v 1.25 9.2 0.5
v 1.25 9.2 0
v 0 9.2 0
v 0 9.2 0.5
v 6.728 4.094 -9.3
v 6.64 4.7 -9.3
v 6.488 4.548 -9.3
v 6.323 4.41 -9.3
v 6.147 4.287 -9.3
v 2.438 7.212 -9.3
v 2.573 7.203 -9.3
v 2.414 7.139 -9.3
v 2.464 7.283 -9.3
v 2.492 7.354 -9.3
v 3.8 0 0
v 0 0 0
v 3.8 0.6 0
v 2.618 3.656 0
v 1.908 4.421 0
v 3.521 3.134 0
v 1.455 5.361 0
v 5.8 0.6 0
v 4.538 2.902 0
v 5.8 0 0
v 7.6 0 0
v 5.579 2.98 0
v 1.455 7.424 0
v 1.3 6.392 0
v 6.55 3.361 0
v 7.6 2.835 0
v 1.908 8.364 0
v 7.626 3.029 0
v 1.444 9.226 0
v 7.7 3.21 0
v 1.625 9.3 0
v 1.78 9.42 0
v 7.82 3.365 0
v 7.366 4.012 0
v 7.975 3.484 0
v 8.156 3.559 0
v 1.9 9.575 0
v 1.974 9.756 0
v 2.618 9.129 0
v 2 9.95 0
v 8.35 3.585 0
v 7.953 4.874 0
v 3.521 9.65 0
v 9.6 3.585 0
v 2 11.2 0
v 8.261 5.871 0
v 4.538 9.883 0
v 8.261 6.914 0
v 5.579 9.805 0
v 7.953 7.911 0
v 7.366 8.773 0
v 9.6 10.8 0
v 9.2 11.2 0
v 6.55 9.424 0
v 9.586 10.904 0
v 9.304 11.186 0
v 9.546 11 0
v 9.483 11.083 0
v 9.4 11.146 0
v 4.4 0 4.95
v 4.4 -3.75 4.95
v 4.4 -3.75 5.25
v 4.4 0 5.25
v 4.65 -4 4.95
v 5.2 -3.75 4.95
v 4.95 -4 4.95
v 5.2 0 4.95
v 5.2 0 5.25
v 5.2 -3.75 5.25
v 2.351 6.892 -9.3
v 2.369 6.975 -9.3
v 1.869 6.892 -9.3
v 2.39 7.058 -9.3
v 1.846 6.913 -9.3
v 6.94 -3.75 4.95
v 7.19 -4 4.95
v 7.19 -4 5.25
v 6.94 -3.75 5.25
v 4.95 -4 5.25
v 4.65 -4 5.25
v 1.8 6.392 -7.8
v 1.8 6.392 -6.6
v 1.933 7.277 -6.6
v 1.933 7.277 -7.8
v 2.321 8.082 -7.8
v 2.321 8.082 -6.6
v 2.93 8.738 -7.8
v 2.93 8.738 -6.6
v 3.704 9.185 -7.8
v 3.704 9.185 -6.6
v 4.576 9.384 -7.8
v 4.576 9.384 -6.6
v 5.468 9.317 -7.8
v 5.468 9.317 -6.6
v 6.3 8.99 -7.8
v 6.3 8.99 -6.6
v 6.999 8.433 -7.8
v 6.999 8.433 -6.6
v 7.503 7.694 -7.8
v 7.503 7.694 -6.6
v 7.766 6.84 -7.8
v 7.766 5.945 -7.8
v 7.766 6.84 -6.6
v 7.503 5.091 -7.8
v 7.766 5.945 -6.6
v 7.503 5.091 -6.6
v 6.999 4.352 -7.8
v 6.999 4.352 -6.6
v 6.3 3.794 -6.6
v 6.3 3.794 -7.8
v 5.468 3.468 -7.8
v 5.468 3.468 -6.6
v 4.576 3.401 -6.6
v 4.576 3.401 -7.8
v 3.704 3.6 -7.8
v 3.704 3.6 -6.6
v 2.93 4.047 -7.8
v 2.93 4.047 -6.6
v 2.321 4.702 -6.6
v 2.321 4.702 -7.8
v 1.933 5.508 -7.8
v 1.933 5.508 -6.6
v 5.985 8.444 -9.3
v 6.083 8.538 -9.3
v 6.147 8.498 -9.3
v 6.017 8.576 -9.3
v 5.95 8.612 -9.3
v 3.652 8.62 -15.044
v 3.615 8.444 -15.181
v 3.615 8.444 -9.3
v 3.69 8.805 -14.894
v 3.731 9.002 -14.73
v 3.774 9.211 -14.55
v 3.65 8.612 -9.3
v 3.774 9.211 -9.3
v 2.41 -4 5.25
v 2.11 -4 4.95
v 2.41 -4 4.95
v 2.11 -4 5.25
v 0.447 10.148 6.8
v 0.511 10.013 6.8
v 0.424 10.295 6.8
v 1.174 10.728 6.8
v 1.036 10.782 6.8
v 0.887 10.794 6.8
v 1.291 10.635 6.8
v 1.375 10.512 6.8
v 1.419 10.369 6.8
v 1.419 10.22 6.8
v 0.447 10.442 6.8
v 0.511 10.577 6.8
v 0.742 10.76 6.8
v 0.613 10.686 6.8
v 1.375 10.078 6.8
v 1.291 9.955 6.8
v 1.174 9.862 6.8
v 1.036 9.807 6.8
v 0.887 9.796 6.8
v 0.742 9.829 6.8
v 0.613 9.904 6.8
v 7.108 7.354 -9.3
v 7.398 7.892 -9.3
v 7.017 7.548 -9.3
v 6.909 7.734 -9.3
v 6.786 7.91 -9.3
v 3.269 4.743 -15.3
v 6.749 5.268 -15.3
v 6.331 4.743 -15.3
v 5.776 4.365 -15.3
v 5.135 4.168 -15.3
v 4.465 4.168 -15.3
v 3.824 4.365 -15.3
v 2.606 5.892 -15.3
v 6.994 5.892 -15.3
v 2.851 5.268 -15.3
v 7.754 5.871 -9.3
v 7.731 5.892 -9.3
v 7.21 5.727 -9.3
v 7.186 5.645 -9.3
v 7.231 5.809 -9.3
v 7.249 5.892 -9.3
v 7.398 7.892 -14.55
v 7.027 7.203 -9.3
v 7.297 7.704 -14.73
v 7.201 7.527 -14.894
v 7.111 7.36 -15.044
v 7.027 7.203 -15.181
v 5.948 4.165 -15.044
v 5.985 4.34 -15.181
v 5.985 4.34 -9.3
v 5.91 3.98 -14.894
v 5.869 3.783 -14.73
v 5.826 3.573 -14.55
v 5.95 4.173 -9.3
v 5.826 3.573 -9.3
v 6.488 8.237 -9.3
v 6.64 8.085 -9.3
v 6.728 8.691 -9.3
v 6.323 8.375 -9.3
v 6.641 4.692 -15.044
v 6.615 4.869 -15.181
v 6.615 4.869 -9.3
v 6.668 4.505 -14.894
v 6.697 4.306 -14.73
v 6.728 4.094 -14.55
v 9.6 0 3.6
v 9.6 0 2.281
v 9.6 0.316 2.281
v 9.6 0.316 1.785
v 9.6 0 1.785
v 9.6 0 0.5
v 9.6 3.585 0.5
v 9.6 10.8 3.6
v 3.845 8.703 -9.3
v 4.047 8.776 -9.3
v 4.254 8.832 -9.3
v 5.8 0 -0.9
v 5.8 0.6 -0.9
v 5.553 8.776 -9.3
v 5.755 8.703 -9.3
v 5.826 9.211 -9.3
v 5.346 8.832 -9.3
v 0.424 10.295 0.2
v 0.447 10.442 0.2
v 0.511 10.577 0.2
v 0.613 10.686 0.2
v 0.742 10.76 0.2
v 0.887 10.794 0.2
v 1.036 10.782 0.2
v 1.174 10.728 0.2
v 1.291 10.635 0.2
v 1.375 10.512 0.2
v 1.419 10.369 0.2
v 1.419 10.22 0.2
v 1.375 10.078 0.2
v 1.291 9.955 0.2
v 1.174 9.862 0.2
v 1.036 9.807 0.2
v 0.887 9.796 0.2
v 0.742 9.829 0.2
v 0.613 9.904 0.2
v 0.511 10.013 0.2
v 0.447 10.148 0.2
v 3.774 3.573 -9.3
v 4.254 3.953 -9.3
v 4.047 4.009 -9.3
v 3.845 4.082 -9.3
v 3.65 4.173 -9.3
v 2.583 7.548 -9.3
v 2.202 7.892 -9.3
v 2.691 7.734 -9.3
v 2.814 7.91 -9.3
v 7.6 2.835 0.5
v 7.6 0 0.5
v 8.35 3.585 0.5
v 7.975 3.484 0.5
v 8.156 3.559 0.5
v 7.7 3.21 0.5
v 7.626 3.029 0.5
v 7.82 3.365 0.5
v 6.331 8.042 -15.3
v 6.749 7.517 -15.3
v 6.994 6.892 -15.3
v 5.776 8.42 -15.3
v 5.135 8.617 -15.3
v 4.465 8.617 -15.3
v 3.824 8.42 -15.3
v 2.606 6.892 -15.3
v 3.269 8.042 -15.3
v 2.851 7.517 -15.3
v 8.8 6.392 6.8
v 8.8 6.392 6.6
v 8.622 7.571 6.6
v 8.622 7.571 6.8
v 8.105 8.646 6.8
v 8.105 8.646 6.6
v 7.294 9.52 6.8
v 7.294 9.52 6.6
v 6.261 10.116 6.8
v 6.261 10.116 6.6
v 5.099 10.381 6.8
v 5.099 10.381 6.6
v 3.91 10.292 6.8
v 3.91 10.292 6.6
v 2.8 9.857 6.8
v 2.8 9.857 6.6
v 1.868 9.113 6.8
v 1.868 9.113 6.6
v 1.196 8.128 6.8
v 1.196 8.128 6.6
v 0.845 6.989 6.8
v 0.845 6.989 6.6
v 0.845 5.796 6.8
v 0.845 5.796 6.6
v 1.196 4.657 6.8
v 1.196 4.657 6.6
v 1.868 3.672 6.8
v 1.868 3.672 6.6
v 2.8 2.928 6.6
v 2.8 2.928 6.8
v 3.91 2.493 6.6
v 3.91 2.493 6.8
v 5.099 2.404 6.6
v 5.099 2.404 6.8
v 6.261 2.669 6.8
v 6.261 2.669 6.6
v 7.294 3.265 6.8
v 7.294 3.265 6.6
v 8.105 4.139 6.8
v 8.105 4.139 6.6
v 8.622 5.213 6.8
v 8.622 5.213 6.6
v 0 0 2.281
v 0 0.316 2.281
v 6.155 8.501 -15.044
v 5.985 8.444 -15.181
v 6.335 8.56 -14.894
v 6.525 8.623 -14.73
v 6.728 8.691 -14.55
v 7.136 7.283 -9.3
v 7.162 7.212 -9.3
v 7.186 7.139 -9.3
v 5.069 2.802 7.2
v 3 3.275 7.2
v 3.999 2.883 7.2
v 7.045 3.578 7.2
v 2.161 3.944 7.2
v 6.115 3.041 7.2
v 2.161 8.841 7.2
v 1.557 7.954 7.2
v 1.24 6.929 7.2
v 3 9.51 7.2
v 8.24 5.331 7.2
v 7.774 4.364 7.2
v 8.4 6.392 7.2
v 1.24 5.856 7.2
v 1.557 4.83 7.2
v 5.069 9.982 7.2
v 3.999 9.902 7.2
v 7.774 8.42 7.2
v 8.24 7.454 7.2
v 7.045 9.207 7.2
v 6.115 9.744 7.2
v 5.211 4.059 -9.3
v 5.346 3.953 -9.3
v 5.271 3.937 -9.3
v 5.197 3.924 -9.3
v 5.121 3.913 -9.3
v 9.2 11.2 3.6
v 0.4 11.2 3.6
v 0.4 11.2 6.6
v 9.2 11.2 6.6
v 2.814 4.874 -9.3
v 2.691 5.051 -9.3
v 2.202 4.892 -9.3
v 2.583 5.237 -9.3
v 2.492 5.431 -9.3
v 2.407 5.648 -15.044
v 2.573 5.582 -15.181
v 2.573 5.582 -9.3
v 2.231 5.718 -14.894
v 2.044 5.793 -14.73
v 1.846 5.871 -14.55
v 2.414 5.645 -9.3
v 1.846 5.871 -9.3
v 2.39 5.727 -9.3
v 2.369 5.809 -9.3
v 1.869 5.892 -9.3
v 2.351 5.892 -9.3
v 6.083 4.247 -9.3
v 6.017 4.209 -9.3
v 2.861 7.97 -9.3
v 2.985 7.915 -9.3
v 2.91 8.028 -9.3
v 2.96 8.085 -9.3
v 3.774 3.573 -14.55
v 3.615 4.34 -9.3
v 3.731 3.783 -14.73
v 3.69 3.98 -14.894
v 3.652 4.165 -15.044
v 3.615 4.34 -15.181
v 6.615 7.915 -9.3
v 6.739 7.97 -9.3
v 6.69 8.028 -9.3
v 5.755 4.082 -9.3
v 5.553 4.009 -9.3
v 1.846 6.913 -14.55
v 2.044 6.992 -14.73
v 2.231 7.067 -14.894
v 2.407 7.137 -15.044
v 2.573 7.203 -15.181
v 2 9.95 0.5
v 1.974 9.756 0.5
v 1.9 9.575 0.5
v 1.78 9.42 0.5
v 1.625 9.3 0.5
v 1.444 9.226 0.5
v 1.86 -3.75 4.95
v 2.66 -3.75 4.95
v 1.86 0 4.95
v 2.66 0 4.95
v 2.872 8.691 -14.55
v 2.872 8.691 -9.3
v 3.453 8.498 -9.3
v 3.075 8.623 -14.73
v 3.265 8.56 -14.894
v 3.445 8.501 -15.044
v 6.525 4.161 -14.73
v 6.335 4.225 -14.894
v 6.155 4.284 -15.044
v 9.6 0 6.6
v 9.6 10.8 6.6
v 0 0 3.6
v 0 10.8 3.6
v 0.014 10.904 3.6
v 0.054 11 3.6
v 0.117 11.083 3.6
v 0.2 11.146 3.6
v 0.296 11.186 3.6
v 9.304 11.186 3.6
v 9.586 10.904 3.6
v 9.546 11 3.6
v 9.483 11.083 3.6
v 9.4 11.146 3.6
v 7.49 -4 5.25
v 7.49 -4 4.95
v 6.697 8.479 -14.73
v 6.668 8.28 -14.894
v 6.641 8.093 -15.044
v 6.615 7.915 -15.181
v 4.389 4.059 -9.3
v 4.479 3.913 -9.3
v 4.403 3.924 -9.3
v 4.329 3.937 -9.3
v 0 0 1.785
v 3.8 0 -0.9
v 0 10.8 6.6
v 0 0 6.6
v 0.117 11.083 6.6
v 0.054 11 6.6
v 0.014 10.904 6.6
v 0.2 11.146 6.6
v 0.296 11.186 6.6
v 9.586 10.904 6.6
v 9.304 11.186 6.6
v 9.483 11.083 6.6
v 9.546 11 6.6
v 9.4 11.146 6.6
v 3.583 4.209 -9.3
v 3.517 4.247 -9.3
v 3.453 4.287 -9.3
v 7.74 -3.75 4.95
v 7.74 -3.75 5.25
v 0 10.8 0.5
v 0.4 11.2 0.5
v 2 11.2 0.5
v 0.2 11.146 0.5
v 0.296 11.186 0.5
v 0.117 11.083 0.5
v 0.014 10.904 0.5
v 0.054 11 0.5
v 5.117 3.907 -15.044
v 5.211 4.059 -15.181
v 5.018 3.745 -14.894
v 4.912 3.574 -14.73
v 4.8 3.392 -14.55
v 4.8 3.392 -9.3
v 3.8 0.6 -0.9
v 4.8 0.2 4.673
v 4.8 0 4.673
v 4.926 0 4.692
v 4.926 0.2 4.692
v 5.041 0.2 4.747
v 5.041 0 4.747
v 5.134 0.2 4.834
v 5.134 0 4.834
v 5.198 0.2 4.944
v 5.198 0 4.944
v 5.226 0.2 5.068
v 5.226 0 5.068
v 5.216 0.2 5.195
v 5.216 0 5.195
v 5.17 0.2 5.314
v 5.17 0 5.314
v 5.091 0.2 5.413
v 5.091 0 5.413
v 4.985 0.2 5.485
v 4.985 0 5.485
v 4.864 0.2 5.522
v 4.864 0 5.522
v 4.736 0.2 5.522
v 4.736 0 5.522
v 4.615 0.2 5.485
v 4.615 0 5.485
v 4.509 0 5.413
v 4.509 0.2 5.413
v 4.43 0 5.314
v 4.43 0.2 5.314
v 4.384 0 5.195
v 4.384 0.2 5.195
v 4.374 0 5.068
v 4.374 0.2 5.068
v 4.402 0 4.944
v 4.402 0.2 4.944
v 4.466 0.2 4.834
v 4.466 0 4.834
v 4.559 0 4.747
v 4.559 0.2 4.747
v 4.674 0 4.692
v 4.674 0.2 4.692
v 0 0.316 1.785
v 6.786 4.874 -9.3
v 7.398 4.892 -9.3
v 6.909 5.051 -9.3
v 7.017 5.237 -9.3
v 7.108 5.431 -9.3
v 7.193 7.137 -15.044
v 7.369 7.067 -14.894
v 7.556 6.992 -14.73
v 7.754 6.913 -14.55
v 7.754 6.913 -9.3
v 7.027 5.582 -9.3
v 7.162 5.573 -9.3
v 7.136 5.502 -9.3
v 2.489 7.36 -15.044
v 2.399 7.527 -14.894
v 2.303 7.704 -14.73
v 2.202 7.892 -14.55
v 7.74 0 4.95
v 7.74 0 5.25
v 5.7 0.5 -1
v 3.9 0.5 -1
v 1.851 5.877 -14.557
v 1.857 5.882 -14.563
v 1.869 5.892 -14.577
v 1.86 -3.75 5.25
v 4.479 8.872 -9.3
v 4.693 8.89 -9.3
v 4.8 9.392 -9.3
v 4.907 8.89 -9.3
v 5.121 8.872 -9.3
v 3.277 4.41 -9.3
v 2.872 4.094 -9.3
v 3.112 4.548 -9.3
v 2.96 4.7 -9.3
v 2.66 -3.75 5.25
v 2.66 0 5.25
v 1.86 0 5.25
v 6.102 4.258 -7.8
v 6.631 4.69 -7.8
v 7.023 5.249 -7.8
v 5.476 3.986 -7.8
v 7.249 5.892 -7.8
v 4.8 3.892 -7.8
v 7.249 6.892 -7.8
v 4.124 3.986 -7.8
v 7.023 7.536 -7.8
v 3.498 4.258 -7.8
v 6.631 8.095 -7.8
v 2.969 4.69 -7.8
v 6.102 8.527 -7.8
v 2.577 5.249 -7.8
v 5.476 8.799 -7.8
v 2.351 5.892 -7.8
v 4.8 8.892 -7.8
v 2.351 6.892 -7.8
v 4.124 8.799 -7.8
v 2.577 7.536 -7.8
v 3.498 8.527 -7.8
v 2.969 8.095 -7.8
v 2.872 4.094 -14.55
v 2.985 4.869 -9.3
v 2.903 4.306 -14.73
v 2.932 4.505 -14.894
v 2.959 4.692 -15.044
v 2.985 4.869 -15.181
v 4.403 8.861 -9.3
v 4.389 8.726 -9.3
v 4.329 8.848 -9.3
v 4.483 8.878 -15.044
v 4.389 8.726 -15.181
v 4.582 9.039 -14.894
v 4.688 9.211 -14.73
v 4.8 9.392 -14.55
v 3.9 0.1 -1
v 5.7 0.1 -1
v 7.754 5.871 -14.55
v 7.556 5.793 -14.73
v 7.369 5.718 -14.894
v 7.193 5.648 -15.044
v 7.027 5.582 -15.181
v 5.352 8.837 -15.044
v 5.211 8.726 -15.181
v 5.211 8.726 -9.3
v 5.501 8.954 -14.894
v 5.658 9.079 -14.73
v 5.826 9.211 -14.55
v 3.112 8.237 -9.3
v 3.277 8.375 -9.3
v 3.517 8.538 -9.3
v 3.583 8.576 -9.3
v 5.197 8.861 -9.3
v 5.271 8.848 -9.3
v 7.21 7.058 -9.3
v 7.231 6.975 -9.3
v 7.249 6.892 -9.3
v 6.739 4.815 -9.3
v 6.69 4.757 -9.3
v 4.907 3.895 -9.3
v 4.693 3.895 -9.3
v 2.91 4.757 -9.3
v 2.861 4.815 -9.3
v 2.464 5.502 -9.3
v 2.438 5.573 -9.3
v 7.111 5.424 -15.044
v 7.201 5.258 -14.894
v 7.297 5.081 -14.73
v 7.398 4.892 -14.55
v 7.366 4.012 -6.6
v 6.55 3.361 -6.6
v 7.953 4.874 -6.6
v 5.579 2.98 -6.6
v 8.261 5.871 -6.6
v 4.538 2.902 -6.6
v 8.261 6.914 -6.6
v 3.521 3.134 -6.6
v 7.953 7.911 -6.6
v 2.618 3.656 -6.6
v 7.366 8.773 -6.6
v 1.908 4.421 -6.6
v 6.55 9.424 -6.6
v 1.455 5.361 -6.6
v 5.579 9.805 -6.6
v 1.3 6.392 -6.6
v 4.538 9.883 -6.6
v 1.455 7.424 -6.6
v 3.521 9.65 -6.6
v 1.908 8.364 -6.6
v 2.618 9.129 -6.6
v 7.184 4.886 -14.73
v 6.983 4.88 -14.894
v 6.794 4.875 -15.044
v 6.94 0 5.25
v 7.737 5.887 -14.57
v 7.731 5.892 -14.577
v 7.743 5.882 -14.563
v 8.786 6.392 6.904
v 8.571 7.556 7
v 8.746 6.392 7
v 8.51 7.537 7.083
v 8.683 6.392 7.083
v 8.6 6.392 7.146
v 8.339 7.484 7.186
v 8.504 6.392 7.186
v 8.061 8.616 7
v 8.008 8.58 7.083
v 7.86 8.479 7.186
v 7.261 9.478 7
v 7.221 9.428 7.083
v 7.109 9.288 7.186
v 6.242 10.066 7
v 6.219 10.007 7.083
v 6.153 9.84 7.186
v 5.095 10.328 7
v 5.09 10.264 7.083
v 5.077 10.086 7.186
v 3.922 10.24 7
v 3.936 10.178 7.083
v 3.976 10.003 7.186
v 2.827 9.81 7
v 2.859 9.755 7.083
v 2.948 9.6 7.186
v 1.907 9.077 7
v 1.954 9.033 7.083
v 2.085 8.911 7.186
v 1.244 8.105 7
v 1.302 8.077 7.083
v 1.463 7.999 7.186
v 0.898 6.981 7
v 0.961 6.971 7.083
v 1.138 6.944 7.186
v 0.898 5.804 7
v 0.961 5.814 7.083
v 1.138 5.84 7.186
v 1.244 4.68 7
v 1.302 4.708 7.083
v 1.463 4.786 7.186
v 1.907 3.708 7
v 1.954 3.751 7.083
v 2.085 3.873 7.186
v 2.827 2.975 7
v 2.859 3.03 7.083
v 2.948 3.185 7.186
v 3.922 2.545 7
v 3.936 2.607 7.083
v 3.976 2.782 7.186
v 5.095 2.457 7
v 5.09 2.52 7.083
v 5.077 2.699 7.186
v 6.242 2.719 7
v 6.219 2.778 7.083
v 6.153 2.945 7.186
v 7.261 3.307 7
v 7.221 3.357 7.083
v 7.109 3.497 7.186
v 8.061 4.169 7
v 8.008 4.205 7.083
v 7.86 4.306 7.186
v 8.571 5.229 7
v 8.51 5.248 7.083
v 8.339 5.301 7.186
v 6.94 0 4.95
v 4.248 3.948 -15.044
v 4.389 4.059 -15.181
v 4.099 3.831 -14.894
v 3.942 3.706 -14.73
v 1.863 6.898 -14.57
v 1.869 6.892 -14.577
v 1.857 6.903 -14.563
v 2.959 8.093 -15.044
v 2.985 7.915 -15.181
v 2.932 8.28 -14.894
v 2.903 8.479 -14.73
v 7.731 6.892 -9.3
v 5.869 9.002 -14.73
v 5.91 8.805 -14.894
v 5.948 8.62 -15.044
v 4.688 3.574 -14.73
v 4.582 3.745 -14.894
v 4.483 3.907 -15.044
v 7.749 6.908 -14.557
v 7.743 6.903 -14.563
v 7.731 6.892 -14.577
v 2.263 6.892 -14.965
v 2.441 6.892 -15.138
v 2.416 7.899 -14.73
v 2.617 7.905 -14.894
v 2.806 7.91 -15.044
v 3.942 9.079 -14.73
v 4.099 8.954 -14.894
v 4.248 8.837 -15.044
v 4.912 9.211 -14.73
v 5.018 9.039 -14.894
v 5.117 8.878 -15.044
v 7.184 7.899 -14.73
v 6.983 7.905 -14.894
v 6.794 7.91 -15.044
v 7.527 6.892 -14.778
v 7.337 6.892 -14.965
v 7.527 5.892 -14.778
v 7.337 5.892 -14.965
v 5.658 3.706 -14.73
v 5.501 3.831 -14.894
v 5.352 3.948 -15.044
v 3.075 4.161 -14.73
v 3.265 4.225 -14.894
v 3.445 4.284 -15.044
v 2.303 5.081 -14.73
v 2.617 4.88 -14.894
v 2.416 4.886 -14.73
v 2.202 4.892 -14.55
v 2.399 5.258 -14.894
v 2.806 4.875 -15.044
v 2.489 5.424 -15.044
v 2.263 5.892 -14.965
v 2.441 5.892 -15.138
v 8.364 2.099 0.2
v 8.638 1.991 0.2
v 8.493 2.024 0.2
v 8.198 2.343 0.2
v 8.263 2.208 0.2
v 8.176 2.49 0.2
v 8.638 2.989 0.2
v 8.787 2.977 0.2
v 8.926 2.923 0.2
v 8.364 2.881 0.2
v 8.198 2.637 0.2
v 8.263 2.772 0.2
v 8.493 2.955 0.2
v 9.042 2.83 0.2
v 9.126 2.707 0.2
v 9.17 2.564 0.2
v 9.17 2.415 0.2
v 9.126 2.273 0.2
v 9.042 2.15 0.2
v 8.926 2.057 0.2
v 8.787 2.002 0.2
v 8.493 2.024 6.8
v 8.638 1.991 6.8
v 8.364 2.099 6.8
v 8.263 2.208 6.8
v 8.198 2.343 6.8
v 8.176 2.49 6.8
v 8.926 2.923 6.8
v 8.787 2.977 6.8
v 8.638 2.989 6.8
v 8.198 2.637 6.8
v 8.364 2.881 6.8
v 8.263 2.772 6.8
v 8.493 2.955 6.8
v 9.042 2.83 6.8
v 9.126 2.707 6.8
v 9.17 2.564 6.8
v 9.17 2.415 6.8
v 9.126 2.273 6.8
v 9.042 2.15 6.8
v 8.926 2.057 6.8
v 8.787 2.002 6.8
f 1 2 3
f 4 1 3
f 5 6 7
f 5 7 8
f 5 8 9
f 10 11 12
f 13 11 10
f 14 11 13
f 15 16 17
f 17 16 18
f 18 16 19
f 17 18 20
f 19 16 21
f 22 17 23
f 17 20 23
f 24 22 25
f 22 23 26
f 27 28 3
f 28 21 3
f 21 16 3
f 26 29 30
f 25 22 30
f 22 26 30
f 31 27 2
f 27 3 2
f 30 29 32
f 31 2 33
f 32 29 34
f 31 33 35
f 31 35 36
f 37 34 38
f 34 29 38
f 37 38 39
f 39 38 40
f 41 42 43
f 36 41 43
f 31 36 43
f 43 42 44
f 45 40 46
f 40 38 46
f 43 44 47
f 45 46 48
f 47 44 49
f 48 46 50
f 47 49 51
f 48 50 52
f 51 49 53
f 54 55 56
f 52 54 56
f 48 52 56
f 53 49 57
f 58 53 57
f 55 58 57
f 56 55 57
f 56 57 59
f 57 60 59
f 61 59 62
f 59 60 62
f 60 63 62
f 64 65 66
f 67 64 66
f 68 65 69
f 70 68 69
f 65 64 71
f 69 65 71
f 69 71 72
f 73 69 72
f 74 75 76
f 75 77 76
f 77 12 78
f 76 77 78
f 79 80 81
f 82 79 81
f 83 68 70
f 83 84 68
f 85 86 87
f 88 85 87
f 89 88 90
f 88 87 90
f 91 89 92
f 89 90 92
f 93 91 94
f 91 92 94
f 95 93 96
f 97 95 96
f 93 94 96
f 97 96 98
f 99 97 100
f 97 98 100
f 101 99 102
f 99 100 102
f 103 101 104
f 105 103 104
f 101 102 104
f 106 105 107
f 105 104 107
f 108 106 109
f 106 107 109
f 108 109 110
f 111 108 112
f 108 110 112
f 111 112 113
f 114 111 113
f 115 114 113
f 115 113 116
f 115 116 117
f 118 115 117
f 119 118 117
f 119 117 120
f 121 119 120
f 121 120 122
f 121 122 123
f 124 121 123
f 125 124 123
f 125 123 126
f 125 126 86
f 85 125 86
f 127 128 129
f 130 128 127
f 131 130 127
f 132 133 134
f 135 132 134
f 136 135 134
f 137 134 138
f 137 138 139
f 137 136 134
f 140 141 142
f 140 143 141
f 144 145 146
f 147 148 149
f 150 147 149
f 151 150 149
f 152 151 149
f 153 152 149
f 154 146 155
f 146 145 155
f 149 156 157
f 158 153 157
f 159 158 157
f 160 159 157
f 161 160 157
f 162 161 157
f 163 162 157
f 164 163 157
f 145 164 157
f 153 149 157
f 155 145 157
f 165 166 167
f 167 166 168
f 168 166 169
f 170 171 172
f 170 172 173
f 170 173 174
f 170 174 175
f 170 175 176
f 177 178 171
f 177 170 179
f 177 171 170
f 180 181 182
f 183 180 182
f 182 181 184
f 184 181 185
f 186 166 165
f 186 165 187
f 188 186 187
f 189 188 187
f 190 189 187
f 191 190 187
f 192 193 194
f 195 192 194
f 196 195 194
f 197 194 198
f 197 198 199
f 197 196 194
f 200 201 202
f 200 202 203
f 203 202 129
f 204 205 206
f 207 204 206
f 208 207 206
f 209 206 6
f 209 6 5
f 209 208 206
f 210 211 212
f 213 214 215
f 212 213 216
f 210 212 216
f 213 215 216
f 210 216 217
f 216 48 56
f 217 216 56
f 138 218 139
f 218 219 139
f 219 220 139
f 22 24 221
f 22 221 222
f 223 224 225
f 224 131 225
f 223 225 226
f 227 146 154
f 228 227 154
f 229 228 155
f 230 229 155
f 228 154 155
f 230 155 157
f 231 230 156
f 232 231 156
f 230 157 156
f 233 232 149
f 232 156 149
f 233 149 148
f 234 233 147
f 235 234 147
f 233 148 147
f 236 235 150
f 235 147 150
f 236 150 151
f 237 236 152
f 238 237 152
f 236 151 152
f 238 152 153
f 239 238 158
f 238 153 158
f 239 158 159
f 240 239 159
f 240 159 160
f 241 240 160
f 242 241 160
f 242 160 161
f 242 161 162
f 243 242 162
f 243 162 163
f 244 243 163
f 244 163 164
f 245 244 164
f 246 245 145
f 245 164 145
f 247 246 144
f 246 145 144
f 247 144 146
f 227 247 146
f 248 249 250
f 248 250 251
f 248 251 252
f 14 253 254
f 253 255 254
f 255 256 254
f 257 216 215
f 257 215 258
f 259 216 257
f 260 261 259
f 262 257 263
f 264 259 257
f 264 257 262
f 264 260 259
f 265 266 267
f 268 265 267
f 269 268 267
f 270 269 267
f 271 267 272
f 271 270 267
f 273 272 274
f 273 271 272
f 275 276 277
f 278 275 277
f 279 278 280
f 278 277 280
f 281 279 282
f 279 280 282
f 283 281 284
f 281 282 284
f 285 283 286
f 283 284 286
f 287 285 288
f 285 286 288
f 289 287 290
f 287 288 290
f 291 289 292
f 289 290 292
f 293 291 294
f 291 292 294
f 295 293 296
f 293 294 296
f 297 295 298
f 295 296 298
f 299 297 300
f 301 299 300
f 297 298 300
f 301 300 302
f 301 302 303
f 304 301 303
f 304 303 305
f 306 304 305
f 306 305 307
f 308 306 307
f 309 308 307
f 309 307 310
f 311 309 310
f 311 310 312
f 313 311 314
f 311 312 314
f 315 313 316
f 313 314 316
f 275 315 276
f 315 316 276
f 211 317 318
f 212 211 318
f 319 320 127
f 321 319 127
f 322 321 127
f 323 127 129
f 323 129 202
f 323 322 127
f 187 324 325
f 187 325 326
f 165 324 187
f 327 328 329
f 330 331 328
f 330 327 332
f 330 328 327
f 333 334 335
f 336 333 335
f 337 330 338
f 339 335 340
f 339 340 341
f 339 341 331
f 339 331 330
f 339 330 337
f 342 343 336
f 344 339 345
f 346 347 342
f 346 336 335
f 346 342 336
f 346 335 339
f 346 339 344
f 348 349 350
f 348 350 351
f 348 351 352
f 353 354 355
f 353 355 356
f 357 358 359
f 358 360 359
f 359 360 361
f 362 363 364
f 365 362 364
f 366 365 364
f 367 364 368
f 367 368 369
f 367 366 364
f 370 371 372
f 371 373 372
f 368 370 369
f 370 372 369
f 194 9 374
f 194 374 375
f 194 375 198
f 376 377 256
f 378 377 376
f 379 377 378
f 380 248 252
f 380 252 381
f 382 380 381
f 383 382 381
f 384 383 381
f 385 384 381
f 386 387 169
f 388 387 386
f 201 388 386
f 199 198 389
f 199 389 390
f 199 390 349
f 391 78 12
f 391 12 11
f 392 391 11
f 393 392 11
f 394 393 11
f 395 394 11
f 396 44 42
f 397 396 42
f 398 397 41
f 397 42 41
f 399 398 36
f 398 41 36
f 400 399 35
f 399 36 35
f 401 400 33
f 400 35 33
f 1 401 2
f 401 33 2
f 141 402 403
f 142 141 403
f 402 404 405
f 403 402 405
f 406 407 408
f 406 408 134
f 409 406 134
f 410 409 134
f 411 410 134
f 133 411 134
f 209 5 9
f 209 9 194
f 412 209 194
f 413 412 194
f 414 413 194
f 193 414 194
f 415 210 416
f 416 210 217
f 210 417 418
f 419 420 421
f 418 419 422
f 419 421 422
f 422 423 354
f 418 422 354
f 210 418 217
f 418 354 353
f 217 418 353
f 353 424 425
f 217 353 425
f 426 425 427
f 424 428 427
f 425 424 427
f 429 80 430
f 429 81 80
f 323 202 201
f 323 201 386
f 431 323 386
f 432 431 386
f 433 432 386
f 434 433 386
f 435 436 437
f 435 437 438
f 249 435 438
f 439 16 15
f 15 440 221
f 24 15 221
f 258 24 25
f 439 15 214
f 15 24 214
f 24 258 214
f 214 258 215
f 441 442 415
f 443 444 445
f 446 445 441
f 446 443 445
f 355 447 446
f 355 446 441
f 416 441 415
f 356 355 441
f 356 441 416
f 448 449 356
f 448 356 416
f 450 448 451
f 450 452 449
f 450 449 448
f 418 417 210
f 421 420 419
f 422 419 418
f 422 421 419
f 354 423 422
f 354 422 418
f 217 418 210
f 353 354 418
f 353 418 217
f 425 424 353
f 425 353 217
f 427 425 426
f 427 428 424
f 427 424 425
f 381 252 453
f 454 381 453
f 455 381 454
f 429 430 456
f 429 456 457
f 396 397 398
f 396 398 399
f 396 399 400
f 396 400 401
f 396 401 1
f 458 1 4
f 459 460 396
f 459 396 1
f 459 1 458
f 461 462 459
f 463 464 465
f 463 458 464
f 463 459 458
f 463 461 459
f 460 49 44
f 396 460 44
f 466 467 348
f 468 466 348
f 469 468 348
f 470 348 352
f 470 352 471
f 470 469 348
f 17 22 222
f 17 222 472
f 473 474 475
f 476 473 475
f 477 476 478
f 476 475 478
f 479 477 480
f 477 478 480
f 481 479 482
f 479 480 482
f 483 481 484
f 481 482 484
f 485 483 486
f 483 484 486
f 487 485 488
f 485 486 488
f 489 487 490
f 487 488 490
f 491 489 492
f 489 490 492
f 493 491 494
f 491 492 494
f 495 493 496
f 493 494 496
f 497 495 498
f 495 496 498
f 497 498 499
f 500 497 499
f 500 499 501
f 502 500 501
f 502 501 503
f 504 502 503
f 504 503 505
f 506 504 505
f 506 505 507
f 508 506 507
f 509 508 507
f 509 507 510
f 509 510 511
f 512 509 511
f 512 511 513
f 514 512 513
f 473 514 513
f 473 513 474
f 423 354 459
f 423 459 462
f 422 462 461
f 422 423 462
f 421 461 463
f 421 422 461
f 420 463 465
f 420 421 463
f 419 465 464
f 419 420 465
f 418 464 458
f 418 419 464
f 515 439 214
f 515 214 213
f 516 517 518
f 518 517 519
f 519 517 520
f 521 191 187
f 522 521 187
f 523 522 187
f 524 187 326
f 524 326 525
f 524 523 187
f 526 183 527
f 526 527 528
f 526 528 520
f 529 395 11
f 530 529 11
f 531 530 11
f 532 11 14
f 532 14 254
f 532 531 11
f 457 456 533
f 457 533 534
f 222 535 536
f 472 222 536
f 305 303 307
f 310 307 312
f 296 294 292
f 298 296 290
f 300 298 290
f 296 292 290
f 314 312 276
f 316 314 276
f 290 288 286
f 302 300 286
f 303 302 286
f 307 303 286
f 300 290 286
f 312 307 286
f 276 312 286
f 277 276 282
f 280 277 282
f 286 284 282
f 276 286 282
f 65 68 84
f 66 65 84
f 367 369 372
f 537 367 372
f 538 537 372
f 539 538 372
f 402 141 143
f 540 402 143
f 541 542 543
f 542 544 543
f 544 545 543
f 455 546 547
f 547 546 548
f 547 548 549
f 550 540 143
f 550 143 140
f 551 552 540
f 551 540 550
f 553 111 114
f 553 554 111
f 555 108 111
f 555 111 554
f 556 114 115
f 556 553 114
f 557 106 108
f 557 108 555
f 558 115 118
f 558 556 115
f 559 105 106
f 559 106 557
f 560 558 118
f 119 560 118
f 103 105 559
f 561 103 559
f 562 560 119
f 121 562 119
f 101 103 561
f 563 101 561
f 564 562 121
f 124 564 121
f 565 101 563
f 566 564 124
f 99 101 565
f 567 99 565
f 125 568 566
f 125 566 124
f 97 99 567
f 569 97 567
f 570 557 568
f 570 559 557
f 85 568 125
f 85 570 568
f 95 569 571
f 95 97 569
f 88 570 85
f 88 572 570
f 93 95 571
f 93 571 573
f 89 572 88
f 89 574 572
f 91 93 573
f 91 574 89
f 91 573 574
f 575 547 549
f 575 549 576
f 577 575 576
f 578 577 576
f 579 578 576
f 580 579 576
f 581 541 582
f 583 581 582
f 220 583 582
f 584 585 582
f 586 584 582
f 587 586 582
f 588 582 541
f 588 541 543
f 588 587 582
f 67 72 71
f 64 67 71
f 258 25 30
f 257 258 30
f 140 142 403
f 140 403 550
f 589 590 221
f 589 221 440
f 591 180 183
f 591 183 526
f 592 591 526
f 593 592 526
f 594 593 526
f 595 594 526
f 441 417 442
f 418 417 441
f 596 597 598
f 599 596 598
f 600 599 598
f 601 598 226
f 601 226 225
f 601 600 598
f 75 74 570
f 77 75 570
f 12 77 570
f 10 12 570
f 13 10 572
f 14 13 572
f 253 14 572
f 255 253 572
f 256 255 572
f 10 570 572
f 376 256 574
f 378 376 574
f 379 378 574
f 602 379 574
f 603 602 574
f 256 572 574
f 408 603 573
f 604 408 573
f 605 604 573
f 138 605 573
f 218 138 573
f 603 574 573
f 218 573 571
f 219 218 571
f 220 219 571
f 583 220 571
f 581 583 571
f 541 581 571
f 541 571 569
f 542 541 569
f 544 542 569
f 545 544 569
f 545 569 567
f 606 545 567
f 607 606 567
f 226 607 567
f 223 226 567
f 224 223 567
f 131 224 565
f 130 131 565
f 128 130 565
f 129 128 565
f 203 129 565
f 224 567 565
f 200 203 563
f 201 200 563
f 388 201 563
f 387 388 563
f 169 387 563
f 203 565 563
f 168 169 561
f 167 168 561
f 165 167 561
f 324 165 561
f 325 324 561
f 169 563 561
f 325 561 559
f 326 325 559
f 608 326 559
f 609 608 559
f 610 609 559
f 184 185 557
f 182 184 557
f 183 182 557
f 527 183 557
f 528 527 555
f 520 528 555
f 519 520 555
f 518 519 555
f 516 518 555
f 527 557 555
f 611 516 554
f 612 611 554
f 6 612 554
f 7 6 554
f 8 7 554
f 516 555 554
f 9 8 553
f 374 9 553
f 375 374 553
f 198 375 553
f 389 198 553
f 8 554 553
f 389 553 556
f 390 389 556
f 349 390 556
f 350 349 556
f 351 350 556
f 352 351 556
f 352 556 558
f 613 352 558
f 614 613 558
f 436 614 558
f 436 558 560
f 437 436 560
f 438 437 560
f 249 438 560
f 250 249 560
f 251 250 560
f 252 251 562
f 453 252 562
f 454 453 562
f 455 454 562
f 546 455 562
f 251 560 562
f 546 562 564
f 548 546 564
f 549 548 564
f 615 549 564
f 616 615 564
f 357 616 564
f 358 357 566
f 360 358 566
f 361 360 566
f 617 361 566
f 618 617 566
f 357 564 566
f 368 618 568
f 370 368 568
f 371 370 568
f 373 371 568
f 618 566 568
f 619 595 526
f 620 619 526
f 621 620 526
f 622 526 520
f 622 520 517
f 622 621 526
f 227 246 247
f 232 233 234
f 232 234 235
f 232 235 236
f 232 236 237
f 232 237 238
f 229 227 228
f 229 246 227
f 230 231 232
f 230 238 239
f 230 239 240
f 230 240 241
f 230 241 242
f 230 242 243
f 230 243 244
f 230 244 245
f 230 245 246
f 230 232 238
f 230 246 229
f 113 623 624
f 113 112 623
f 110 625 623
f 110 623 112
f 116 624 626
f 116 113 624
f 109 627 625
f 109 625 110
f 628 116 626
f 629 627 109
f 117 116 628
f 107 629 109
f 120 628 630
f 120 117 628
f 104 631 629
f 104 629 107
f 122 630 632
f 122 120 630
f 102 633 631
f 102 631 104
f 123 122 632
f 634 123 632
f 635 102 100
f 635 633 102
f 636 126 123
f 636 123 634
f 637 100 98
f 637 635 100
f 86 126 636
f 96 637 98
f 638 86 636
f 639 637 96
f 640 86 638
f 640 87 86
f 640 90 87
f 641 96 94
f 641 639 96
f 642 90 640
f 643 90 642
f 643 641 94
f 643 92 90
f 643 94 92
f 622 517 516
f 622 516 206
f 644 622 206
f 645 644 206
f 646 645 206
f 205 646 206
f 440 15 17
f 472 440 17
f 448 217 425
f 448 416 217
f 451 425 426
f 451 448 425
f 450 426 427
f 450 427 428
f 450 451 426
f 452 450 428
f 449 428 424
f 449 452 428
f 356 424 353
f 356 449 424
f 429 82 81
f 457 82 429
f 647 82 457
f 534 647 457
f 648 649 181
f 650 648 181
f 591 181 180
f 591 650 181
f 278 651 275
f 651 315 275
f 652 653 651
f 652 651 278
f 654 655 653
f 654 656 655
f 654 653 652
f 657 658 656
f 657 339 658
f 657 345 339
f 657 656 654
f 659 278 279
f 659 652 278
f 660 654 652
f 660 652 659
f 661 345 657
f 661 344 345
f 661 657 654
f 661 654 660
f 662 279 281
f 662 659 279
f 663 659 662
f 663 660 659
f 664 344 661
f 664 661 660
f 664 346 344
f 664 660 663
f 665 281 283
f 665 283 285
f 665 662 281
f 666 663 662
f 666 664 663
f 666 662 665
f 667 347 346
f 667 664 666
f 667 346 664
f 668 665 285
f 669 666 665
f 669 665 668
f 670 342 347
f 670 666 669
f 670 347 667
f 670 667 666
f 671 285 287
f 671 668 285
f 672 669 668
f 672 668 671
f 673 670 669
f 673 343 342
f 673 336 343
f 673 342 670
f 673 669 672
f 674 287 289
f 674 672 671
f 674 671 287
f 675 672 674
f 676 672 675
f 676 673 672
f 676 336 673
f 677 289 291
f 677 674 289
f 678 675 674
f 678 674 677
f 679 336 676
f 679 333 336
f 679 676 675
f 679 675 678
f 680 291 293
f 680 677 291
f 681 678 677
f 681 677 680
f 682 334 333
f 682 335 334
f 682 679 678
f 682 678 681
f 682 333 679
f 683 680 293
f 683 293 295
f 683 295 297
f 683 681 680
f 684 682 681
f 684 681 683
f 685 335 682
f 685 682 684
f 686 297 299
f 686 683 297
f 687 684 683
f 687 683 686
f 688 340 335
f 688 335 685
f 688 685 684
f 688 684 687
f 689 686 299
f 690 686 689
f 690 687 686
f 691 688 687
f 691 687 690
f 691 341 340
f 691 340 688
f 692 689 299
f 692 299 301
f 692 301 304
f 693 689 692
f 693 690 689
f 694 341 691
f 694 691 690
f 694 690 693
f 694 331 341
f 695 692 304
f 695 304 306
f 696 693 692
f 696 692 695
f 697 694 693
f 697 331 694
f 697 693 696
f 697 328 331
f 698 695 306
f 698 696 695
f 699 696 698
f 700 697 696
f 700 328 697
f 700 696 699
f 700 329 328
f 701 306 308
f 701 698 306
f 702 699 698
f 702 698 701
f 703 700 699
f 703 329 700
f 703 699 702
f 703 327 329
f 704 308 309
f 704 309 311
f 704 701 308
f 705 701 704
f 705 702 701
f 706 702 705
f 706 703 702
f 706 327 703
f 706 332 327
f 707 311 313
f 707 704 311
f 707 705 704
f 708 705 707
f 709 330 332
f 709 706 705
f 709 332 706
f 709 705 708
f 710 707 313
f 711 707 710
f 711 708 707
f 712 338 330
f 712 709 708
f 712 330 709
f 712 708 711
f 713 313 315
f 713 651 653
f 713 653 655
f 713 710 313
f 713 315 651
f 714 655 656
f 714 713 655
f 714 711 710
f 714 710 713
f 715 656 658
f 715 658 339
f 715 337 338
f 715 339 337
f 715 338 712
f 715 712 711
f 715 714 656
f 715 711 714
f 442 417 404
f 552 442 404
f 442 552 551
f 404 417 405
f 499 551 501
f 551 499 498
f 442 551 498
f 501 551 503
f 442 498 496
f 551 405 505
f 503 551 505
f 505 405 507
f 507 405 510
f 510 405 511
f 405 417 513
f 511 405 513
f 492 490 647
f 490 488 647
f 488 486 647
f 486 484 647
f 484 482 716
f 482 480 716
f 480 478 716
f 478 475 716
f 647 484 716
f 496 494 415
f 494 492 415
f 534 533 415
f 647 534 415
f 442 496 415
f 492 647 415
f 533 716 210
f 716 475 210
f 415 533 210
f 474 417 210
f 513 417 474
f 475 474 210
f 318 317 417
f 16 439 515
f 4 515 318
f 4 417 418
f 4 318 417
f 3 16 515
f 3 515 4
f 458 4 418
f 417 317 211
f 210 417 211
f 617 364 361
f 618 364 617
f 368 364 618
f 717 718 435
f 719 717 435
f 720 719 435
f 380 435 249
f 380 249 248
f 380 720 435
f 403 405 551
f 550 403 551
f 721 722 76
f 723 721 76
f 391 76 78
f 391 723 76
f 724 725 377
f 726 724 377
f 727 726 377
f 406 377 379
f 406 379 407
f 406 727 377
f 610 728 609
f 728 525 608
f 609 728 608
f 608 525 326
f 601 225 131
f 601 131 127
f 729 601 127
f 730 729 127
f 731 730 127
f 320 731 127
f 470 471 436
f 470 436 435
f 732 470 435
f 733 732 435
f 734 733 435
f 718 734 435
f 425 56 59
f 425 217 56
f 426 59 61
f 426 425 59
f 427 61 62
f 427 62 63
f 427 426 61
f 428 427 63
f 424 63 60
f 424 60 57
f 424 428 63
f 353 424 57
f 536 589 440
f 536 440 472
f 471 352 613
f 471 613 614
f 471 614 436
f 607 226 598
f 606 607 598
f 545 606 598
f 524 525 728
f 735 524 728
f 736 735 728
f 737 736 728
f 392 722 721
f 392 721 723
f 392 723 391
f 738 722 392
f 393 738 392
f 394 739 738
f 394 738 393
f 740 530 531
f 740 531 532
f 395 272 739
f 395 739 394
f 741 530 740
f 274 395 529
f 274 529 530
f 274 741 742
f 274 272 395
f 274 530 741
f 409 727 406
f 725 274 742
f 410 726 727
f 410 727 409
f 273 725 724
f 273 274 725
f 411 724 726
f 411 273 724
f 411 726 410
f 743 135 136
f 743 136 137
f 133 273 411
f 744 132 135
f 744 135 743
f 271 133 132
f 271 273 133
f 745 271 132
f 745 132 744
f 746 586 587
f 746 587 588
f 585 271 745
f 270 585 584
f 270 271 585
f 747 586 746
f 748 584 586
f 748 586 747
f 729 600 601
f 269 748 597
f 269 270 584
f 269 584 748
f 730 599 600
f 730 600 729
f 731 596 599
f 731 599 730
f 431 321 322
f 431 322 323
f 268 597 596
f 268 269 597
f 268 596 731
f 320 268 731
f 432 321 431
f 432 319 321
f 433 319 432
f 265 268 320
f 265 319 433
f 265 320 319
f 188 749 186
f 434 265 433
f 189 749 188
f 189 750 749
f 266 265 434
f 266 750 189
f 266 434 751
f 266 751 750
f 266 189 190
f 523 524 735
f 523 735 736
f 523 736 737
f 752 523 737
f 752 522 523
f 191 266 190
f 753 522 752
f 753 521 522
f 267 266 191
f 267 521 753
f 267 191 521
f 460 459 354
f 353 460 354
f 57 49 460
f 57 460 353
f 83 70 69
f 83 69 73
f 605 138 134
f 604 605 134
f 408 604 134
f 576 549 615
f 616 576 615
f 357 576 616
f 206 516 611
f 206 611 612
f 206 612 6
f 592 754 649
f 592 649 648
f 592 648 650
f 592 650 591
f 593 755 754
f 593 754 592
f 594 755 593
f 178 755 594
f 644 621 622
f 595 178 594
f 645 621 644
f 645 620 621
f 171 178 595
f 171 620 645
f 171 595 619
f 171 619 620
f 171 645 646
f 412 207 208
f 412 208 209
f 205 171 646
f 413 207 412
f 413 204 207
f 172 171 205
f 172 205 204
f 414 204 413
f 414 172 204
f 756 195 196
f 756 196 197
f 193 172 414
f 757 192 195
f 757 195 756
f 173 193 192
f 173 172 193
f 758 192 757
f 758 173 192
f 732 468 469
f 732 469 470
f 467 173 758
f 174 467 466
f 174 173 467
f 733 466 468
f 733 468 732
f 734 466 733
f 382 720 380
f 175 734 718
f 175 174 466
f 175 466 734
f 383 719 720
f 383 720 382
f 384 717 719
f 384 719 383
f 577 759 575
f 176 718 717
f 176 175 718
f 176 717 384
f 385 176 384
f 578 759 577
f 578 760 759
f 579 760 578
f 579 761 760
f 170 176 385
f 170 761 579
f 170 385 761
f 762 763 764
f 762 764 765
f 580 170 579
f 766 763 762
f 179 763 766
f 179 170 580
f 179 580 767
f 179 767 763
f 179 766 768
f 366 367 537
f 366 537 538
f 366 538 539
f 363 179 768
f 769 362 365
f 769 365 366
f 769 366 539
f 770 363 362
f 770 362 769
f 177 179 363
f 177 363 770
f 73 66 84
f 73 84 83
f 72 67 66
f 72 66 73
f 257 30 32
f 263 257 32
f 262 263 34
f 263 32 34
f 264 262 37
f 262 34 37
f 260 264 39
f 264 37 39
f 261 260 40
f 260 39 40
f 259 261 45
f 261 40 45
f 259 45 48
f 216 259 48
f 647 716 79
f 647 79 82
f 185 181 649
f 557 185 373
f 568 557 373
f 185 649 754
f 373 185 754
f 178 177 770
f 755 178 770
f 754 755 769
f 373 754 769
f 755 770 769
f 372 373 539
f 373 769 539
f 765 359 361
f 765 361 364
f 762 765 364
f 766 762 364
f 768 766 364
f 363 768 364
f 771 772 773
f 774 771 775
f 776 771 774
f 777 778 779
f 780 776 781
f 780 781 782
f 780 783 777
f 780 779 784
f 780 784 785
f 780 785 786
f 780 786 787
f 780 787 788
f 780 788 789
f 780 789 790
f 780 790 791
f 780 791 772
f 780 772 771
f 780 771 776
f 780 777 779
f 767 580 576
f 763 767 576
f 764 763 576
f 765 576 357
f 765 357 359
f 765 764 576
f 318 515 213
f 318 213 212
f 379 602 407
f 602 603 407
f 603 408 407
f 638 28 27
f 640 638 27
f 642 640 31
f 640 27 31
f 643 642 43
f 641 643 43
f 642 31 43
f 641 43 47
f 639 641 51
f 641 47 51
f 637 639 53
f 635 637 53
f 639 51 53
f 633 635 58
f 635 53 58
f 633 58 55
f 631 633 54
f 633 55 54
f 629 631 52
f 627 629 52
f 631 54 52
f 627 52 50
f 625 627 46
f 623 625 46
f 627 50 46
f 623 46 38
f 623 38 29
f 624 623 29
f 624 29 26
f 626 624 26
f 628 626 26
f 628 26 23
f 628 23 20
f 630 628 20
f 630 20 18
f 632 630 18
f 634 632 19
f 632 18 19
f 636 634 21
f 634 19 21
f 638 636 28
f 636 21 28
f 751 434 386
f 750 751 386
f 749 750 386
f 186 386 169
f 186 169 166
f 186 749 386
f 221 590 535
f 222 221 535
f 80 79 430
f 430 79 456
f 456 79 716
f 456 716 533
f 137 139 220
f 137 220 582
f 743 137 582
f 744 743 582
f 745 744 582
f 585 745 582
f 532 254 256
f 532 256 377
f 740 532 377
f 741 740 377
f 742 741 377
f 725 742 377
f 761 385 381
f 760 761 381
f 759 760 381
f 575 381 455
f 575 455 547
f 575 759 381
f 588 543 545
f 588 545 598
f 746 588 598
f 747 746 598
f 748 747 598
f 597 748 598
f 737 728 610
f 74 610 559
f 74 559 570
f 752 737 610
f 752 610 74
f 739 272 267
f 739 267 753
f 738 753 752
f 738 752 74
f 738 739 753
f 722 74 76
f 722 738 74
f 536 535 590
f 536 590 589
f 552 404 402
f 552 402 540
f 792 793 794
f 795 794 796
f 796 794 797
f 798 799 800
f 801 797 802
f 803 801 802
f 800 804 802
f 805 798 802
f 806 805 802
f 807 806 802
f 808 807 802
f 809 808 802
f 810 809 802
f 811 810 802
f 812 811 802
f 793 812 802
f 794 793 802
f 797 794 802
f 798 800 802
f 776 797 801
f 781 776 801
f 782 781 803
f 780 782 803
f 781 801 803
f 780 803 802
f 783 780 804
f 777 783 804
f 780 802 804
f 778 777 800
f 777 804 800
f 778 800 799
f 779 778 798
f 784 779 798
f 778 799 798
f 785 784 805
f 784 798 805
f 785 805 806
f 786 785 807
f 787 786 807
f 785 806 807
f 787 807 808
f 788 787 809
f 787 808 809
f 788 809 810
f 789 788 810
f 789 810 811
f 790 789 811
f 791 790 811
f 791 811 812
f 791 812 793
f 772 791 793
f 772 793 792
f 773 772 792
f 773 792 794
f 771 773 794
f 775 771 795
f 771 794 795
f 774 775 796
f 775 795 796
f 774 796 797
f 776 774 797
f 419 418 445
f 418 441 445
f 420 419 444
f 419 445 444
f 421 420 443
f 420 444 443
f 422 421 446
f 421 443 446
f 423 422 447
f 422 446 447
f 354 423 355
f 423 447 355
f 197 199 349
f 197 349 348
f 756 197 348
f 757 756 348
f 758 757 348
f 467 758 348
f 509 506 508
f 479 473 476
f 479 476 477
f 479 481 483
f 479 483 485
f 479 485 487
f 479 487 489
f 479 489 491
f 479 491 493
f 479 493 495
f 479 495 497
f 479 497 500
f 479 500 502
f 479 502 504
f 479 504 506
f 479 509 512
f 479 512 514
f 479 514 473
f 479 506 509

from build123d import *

# Parameters (mm, degrees)
SKETCH1_W                      = 9.6
SKETCH1_H                      = 11.2
UPPER_BODY_EXTRUDE_DEPTH       = 3.6
SKETCH13_W                     = 9.6
SKETCH13_H                     = 11.2
LOWER_BODY_EXTRUDE_DEPTH       = 3
SKETCH2_R                      = 4
BOTTOM_DOME_EXTRUDE_DEPTH      = 0.6
DOME_FILLET_R                  = 0.4
SKETCH3_R                      = 3.5
THREADED_SECTION_EXTRUDE_DEPTH = 6.6
SKETCH4_R                      = 3
STRAIN_RELIEF_EXTRUDE_DEPTH    = 1.2
SKETCH10_R                     = 2.5
ACTUATOR_SHAFT_EXTRUDE_DEPTH   = 1.5
SKETCH11_R                     = 3
SLINED_SECTION_EXTRUDE_DEPTH   = 6
SHAFT_END_CHAMFER_SIZE         = 0.75
SKETCH5_R                      = 3.244987866
SPLINE_CUT_DEPTH               = 6
SHAFT_SLOT_XUT_REACH           = 28.904
SKETCH12_W                     = 6.542928606
SKETCH12_H                     = 1
SKETCH14_W                     = 0.8
SKETCH14_H                     = 0.3
PIN_EXTRUDE_DEPTH              = 4
PIN_TIP_FILLET_SIZE            = 0.25
UPPER_BODY_EDGE_FILLET_R       = 0.4
LOWER_BODY_EDGE_FILLET_R       = 0.4
SKETCH15_W                     = 0.496561546
SKETCH15_H                     = 0.496561546
MOUNTING_FACE_SLOT_CUT_DEPTH   = 22.252999788
SKETCH17_W                     = 2
SKETCH17_H                     = 0.6
LOCATING_PIN_EXTRUDE_DEPTH     = 1
LOCATING_PIN_CHAMFER_SIZE      = 0.1
BODY_RIVET_RECESS_CUT_DEPTH    = 0.5
RIVET_EXTRUDE_DEPTH            = 0.3
RIVET_EXTRUDE_DEPTH_BACK       = 6.3
SKETCH18_R                     = 0.5
RIVET_EXTRUDE_2_DEPTH          = 0.3
RIVET_EXTRUDE_2_DEPTH_BACK     = 6.3
SKETCH22_R                     = 0.427200187
ALIGNMENT_CENTRE_PIN_CUT_DEPTH = 0.2


with BuildPart() as part:
    # Sketch1 → Upper Body Extrude (new body)
    with BuildSketch(Plane.XY):
        with Locations((4.8, 5.6)):
            Rectangle(SKETCH1_W, SKETCH1_H)
    extrude(amount=UPPER_BODY_EXTRUDE_DEPTH)

    # Sketch3 → Threaded Section Extrude (add)
    with BuildSketch(Plane(origin=(0, 0, 0), x_dir=(-1, 0, 0), z_dir=(0, 0, -1))):
        with Locations((-4.8, 6.392421353)):
            Circle(SKETCH3_R)
    extrude(amount=THREADED_SECTION_EXTRUDE_DEPTH)

    # Sketch4 → Strain Relief Extrude (add)
    with BuildSketch(Plane(origin=(0, 0, -6.6), x_dir=(-1, 0, 0), z_dir=(0, 0, -1))):
        with Locations((-4.8, 6.392421353)):
            Circle(SKETCH4_R)
    extrude(amount=STRAIN_RELIEF_EXTRUDE_DEPTH)

    # Sketch10 → Actuator Shaft Extrude (add)
    with BuildSketch(Plane(origin=(0, 0, -7.8), x_dir=(-1, 0, 0), z_dir=(0, 0, -1))):
        with Locations((-4.8, 6.392421353)):
            Circle(SKETCH10_R)
    extrude(amount=ACTUATOR_SHAFT_EXTRUDE_DEPTH)

    # Sketch11 → Slined Section Extrude (add)
    with BuildSketch(Plane(origin=(0, 0, -9.3), x_dir=(-1, 0, 0), z_dir=(0, 0, -1))):
        with Locations((-4.8, 6.392421353)):
            Circle(SKETCH11_R)
    extrude(amount=SLINED_SECTION_EXTRUDE_DEPTH)

    # Shaft End Chamfer
    shaft_end_chamfer_edges = [part.edges().sort_by_distance(p)[0] for p in [
        (7.8, 6.392421353, -15.3),
    ]]
    chamfer(shaft_end_chamfer_edges, length=SHAFT_END_CHAMFER_SIZE)

    # Sketch5 → Spline CUt (cut)
    with BuildSketch(Plane(origin=(0, 0, -15.3), x_dir=(-1, 0, 0), z_dir=(0, 0, -1))):
        with Locations((-4.8, 6.392421353)):
            Circle(SKETCH5_R)
        Polygon((-4.8, 9.392421353), (-5.211446902, 8.72585269), (-5.82606043, 9.211499216), (-5.984714138, 8.444406433), (-6.728362829, 8.690554683), (-6.615087364, 7.915460491), (-7.398076211, 7.892421353), (-7.026534266, 7.202813552), (-7.754423259, 6.913365886), (-7.169428276, 6.392421353), (-7.754423259, 5.87147682), (-7.026534266, 5.582029155), (-7.398076211, 4.892421353), (-6.615087364, 4.869382215), (-6.728362829, 4.094288024), (-5.984714138, 4.340436274), (-5.82606043, 3.573343491), (-5.211446902, 4.058990017), (-4.8, 3.392421353), (-4.388553098, 4.058990017), (-3.77393957, 3.573343491), (-3.615285862, 4.340436274), (-2.871637171, 4.094288024), (-2.984912636, 4.869382215), (-2.201923789, 4.892421353), (-2.573465734, 5.582029155), (-1.845576741, 5.87147682), (-2.430571724, 6.392421353), (-1.845576741, 6.913365886), (-2.573465734, 7.202813552), (-2.201923789, 7.892421353), (-2.984912636, 7.915460491), (-2.871637171, 8.690554683), (-3.615285862, 8.444406433), (-3.77393957, 9.211499216), (-4.388553098, 8.72585269), align=None, mode=Mode.SUBTRACT)
    extrude(amount=-SPLINE_CUT_DEPTH, mode=Mode.SUBTRACT)

    # Shaft Slot Xut: up to this face of the body (flat: up to its plane)
    shaft_slot_xut_end = Plane(part.part.faces().sort_by_distance((7.715147186, 6.392421353, -7.8))[0])
    # Sketch12 → Shaft Slot Xut (cut, up to the picked face)
    with BuildSketch(Plane(origin=(0, 0, -15.3), x_dir=(-1, 0, 0), z_dir=(0, 0, -1)), mode=Mode.PRIVATE) as shaft_slot_xut_sk1:
        with Locations((-4.778190238, 6.392421353)):
            Rectangle(SKETCH12_W, SKETCH12_H)
    shaft_slot_xut_tool1 = split(extrude(shaft_slot_xut_sk1.sketch, amount=-SHAFT_SLOT_XUT_REACH, mode=Mode.PRIVATE), bisect_by=shaft_slot_xut_end, keep=Keep.BOTH, mode=Mode.PRIVATE)
    add(shaft_slot_xut_tool1.solids().sort_by(Axis((4.77819, 6.392421, -15.3), (0, 0, 1)))[0], mode=Mode.SUBTRACT)

    # Upper Body Edge Fillet
    upper_body_edge_fillet_edges = [part.edges().sort_by_distance(p)[0] for p in [
        (0, 11.2, 1.8),
        (9.6, 11.2, 1.8),
    ]]
    fillet(upper_body_edge_fillet_edges, radius=UPPER_BODY_EDGE_FILLET_R)

    # Sketch15 → Mounting Face Slot Cut (cut, through all)
    with BuildSketch(Plane.ZY):
        with Locations((2.032878938, 0.06764173)):
            Rectangle(SKETCH15_W, SKETCH15_H)
    extrude(amount=-MOUNTING_FACE_SLOT_CUT_DEPTH, mode=Mode.SUBTRACT)

    # Sketch17 → Locating Pin Extrude (add)
    with BuildSketch(Plane(origin=(0, 0, 0), x_dir=(-1, 0, 0), z_dir=(0, 0, -1))):
        with Locations((-4.8, 0.3)):
            Rectangle(SKETCH17_W, SKETCH17_H)
    extrude(amount=LOCATING_PIN_EXTRUDE_DEPTH)

    # Locating Pin Chamfer
    locating_pin_chamfer_edges = [part.edges().sort_by_distance(p)[0] for p in [
        (5.8, 0.3, -1),
        (4.8, 0, -1),
        (3.8, 0.3, -1),
        (4.8, 0.6, -1),
    ]]
    chamfer(locating_pin_chamfer_edges, length=LOCATING_PIN_CHAMFER_SIZE)

    # Sketch20 → Body Rivet Recess Cut (cut)
    with BuildSketch(Plane(origin=(0, 0, 0), x_dir=(-1, 0, 0), z_dir=(0, 0, -1))):
        with BuildLine():
            Line((-2, 11.2), (-2, 9.95))
            ThreePointArc((-2, 9.95), (-1.780330086, 9.419669914), (-1.25, 9.2))
            Line((-1.25, 9.2), (0, 9.2))
            Line((0, 9.2), (0, 11.2))
            Line((0, 11.2), (-2, 11.2))
        make_face()
        with BuildLine():
            Line((-7.6, 1.584842707), (-7.6, 2.834842707))
            ThreePointArc((-7.6, 2.834842707), (-7.819669914, 3.365172793), (-8.35, 3.584842707))
            Line((-8.35, 3.584842707), (-9.6, 3.584842707))
            Line((-9.6, 3.584842707), (-9.6, 0))
            Line((-9.6, 0), (-7.6, 0))
            Line((-7.6, 0), (-7.6, 1.584842707))
        make_face()
    extrude(amount=-BODY_RIVET_RECESS_CUT_DEPTH, mode=Mode.SUBTRACT)


with BuildPart() as body_2:
    # Sketch13 → Lower Body Extrude (new body)
    with BuildSketch(Plane.XY.offset(3.6)):
        with Locations((4.8, 5.6)):
            Rectangle(SKETCH13_W, SKETCH13_H)
    extrude(amount=LOWER_BODY_EXTRUDE_DEPTH)

    # Sketch14 → Pin Extrude (add)
    with BuildSketch(Plane.XZ):
        with Locations((4.8, 5.1)):
            Rectangle(SKETCH14_W, SKETCH14_H)
        with Locations((7.34, 5.1)):
            Rectangle(SKETCH14_W, SKETCH14_H)
        with Locations((2.26, 5.1)):
            Rectangle(SKETCH14_W, SKETCH14_H)
    extrude(amount=PIN_EXTRUDE_DEPTH)

    # Pin Tip FIllet
    pin_tip_fillet_edges = [body_2.edges().sort_by_distance(p)[0] for p in [
        (4.4, -4, 5.1),
        (5.2, -4, 5.1),
        (7.74, -4, 5.1),
        (6.94, -4, 5.1),
        (2.66, -4, 5.1),
        (1.86, -4, 5.1),
    ]]
    chamfer(pin_tip_fillet_edges, length=PIN_TIP_FILLET_SIZE)

    # Lower Body Edge Fillet
    lower_body_edge_fillet_edges = [body_2.edges().sort_by_distance(p)[0] for p in [
        (0, 11.2, 5.1),
        (9.6, 11.2, 5.1),
    ]]
    fillet(lower_body_edge_fillet_edges, radius=LOWER_BODY_EDGE_FILLET_R)

    # Sketch22 → Alignment Centre-Pin Cut (cut)
    with BuildSketch(Plane.XZ):
        with Locations(Location((4.8, 5.1, 0), (0, 0, 270))):
            Circle(SKETCH22_R)
    extrude(amount=-ALIGNMENT_CENTRE_PIN_CUT_DEPTH, mode=Mode.SUBTRACT)


with BuildPart() as body_3:
    # Sketch2 → Bottom Dome Extrude (new body)
    with BuildSketch(Plane.XY.offset(6.6)):
        with Locations((4.8, 6.392421353)):
            Circle(SKETCH2_R)
    extrude(amount=BOTTOM_DOME_EXTRUDE_DEPTH)

    # Dome Fillet
    dome_fillet_edges = [body_3.edges().sort_by_distance(p)[0] for p in [
        (0.8, 6.392421353, 7.2),
    ]]
    fillet(dome_fillet_edges, radius=DOME_FILLET_R)


with BuildPart() as body_4:
    # Sketch18 → Rivet Extrude (new, two sides: drawn at the far end of the back side and taken through both)
    with BuildSketch(Plane(origin=(0, 0, 0.5), x_dir=(-1, 0, 0), z_dir=(0, 0, -1)).offset(-RIVET_EXTRUDE_DEPTH_BACK)):
        with Locations((-0.92435637, 10.294906004)):
            Circle(SKETCH18_R)
    extrude(amount=RIVET_EXTRUDE_DEPTH + RIVET_EXTRUDE_DEPTH_BACK)


with BuildPart() as body_5:
    # Sketch18 → Rivet Extrude 2 (new, two sides: drawn at the far end of the back side and taken through both)
    with BuildSketch(Plane(origin=(0, 0, 0.5), x_dir=(-1, 0, 0), z_dir=(0, 0, -1)).offset(-RIVET_EXTRUDE_2_DEPTH_BACK)):
        with Locations((-8.67564363, 2.489936702)):
            Circle(SKETCH18_R)
    extrude(amount=RIVET_EXTRUDE_2_DEPTH + RIVET_EXTRUDE_2_DEPTH_BACK)


with BuildPart() as alignment_centre_pin_cut_piece_1:
    # of the separate pieces the step leaves, piece 1, a body of its own (alignment_centre_pin_cut_pieces)
    add(body_2.part.solids().sort_by_distance((9.6, 10.8, 3.6))[0])


with BuildPart() as alignment_centre_pin_cut_piece_2:
    # of the separate pieces the step leaves, piece 2, a body of its own (alignment_centre_pin_cut_pieces)
    add(body_2.part.solids().sort_by_distance((4.4, -3.75, 4.95))[0])


solid = Compound([part.part, body_3.part, body_4.part, body_5.part, alignment_centre_pin_cut_piece_1.part, alignment_centre_pin_cut_piece_2.part])
